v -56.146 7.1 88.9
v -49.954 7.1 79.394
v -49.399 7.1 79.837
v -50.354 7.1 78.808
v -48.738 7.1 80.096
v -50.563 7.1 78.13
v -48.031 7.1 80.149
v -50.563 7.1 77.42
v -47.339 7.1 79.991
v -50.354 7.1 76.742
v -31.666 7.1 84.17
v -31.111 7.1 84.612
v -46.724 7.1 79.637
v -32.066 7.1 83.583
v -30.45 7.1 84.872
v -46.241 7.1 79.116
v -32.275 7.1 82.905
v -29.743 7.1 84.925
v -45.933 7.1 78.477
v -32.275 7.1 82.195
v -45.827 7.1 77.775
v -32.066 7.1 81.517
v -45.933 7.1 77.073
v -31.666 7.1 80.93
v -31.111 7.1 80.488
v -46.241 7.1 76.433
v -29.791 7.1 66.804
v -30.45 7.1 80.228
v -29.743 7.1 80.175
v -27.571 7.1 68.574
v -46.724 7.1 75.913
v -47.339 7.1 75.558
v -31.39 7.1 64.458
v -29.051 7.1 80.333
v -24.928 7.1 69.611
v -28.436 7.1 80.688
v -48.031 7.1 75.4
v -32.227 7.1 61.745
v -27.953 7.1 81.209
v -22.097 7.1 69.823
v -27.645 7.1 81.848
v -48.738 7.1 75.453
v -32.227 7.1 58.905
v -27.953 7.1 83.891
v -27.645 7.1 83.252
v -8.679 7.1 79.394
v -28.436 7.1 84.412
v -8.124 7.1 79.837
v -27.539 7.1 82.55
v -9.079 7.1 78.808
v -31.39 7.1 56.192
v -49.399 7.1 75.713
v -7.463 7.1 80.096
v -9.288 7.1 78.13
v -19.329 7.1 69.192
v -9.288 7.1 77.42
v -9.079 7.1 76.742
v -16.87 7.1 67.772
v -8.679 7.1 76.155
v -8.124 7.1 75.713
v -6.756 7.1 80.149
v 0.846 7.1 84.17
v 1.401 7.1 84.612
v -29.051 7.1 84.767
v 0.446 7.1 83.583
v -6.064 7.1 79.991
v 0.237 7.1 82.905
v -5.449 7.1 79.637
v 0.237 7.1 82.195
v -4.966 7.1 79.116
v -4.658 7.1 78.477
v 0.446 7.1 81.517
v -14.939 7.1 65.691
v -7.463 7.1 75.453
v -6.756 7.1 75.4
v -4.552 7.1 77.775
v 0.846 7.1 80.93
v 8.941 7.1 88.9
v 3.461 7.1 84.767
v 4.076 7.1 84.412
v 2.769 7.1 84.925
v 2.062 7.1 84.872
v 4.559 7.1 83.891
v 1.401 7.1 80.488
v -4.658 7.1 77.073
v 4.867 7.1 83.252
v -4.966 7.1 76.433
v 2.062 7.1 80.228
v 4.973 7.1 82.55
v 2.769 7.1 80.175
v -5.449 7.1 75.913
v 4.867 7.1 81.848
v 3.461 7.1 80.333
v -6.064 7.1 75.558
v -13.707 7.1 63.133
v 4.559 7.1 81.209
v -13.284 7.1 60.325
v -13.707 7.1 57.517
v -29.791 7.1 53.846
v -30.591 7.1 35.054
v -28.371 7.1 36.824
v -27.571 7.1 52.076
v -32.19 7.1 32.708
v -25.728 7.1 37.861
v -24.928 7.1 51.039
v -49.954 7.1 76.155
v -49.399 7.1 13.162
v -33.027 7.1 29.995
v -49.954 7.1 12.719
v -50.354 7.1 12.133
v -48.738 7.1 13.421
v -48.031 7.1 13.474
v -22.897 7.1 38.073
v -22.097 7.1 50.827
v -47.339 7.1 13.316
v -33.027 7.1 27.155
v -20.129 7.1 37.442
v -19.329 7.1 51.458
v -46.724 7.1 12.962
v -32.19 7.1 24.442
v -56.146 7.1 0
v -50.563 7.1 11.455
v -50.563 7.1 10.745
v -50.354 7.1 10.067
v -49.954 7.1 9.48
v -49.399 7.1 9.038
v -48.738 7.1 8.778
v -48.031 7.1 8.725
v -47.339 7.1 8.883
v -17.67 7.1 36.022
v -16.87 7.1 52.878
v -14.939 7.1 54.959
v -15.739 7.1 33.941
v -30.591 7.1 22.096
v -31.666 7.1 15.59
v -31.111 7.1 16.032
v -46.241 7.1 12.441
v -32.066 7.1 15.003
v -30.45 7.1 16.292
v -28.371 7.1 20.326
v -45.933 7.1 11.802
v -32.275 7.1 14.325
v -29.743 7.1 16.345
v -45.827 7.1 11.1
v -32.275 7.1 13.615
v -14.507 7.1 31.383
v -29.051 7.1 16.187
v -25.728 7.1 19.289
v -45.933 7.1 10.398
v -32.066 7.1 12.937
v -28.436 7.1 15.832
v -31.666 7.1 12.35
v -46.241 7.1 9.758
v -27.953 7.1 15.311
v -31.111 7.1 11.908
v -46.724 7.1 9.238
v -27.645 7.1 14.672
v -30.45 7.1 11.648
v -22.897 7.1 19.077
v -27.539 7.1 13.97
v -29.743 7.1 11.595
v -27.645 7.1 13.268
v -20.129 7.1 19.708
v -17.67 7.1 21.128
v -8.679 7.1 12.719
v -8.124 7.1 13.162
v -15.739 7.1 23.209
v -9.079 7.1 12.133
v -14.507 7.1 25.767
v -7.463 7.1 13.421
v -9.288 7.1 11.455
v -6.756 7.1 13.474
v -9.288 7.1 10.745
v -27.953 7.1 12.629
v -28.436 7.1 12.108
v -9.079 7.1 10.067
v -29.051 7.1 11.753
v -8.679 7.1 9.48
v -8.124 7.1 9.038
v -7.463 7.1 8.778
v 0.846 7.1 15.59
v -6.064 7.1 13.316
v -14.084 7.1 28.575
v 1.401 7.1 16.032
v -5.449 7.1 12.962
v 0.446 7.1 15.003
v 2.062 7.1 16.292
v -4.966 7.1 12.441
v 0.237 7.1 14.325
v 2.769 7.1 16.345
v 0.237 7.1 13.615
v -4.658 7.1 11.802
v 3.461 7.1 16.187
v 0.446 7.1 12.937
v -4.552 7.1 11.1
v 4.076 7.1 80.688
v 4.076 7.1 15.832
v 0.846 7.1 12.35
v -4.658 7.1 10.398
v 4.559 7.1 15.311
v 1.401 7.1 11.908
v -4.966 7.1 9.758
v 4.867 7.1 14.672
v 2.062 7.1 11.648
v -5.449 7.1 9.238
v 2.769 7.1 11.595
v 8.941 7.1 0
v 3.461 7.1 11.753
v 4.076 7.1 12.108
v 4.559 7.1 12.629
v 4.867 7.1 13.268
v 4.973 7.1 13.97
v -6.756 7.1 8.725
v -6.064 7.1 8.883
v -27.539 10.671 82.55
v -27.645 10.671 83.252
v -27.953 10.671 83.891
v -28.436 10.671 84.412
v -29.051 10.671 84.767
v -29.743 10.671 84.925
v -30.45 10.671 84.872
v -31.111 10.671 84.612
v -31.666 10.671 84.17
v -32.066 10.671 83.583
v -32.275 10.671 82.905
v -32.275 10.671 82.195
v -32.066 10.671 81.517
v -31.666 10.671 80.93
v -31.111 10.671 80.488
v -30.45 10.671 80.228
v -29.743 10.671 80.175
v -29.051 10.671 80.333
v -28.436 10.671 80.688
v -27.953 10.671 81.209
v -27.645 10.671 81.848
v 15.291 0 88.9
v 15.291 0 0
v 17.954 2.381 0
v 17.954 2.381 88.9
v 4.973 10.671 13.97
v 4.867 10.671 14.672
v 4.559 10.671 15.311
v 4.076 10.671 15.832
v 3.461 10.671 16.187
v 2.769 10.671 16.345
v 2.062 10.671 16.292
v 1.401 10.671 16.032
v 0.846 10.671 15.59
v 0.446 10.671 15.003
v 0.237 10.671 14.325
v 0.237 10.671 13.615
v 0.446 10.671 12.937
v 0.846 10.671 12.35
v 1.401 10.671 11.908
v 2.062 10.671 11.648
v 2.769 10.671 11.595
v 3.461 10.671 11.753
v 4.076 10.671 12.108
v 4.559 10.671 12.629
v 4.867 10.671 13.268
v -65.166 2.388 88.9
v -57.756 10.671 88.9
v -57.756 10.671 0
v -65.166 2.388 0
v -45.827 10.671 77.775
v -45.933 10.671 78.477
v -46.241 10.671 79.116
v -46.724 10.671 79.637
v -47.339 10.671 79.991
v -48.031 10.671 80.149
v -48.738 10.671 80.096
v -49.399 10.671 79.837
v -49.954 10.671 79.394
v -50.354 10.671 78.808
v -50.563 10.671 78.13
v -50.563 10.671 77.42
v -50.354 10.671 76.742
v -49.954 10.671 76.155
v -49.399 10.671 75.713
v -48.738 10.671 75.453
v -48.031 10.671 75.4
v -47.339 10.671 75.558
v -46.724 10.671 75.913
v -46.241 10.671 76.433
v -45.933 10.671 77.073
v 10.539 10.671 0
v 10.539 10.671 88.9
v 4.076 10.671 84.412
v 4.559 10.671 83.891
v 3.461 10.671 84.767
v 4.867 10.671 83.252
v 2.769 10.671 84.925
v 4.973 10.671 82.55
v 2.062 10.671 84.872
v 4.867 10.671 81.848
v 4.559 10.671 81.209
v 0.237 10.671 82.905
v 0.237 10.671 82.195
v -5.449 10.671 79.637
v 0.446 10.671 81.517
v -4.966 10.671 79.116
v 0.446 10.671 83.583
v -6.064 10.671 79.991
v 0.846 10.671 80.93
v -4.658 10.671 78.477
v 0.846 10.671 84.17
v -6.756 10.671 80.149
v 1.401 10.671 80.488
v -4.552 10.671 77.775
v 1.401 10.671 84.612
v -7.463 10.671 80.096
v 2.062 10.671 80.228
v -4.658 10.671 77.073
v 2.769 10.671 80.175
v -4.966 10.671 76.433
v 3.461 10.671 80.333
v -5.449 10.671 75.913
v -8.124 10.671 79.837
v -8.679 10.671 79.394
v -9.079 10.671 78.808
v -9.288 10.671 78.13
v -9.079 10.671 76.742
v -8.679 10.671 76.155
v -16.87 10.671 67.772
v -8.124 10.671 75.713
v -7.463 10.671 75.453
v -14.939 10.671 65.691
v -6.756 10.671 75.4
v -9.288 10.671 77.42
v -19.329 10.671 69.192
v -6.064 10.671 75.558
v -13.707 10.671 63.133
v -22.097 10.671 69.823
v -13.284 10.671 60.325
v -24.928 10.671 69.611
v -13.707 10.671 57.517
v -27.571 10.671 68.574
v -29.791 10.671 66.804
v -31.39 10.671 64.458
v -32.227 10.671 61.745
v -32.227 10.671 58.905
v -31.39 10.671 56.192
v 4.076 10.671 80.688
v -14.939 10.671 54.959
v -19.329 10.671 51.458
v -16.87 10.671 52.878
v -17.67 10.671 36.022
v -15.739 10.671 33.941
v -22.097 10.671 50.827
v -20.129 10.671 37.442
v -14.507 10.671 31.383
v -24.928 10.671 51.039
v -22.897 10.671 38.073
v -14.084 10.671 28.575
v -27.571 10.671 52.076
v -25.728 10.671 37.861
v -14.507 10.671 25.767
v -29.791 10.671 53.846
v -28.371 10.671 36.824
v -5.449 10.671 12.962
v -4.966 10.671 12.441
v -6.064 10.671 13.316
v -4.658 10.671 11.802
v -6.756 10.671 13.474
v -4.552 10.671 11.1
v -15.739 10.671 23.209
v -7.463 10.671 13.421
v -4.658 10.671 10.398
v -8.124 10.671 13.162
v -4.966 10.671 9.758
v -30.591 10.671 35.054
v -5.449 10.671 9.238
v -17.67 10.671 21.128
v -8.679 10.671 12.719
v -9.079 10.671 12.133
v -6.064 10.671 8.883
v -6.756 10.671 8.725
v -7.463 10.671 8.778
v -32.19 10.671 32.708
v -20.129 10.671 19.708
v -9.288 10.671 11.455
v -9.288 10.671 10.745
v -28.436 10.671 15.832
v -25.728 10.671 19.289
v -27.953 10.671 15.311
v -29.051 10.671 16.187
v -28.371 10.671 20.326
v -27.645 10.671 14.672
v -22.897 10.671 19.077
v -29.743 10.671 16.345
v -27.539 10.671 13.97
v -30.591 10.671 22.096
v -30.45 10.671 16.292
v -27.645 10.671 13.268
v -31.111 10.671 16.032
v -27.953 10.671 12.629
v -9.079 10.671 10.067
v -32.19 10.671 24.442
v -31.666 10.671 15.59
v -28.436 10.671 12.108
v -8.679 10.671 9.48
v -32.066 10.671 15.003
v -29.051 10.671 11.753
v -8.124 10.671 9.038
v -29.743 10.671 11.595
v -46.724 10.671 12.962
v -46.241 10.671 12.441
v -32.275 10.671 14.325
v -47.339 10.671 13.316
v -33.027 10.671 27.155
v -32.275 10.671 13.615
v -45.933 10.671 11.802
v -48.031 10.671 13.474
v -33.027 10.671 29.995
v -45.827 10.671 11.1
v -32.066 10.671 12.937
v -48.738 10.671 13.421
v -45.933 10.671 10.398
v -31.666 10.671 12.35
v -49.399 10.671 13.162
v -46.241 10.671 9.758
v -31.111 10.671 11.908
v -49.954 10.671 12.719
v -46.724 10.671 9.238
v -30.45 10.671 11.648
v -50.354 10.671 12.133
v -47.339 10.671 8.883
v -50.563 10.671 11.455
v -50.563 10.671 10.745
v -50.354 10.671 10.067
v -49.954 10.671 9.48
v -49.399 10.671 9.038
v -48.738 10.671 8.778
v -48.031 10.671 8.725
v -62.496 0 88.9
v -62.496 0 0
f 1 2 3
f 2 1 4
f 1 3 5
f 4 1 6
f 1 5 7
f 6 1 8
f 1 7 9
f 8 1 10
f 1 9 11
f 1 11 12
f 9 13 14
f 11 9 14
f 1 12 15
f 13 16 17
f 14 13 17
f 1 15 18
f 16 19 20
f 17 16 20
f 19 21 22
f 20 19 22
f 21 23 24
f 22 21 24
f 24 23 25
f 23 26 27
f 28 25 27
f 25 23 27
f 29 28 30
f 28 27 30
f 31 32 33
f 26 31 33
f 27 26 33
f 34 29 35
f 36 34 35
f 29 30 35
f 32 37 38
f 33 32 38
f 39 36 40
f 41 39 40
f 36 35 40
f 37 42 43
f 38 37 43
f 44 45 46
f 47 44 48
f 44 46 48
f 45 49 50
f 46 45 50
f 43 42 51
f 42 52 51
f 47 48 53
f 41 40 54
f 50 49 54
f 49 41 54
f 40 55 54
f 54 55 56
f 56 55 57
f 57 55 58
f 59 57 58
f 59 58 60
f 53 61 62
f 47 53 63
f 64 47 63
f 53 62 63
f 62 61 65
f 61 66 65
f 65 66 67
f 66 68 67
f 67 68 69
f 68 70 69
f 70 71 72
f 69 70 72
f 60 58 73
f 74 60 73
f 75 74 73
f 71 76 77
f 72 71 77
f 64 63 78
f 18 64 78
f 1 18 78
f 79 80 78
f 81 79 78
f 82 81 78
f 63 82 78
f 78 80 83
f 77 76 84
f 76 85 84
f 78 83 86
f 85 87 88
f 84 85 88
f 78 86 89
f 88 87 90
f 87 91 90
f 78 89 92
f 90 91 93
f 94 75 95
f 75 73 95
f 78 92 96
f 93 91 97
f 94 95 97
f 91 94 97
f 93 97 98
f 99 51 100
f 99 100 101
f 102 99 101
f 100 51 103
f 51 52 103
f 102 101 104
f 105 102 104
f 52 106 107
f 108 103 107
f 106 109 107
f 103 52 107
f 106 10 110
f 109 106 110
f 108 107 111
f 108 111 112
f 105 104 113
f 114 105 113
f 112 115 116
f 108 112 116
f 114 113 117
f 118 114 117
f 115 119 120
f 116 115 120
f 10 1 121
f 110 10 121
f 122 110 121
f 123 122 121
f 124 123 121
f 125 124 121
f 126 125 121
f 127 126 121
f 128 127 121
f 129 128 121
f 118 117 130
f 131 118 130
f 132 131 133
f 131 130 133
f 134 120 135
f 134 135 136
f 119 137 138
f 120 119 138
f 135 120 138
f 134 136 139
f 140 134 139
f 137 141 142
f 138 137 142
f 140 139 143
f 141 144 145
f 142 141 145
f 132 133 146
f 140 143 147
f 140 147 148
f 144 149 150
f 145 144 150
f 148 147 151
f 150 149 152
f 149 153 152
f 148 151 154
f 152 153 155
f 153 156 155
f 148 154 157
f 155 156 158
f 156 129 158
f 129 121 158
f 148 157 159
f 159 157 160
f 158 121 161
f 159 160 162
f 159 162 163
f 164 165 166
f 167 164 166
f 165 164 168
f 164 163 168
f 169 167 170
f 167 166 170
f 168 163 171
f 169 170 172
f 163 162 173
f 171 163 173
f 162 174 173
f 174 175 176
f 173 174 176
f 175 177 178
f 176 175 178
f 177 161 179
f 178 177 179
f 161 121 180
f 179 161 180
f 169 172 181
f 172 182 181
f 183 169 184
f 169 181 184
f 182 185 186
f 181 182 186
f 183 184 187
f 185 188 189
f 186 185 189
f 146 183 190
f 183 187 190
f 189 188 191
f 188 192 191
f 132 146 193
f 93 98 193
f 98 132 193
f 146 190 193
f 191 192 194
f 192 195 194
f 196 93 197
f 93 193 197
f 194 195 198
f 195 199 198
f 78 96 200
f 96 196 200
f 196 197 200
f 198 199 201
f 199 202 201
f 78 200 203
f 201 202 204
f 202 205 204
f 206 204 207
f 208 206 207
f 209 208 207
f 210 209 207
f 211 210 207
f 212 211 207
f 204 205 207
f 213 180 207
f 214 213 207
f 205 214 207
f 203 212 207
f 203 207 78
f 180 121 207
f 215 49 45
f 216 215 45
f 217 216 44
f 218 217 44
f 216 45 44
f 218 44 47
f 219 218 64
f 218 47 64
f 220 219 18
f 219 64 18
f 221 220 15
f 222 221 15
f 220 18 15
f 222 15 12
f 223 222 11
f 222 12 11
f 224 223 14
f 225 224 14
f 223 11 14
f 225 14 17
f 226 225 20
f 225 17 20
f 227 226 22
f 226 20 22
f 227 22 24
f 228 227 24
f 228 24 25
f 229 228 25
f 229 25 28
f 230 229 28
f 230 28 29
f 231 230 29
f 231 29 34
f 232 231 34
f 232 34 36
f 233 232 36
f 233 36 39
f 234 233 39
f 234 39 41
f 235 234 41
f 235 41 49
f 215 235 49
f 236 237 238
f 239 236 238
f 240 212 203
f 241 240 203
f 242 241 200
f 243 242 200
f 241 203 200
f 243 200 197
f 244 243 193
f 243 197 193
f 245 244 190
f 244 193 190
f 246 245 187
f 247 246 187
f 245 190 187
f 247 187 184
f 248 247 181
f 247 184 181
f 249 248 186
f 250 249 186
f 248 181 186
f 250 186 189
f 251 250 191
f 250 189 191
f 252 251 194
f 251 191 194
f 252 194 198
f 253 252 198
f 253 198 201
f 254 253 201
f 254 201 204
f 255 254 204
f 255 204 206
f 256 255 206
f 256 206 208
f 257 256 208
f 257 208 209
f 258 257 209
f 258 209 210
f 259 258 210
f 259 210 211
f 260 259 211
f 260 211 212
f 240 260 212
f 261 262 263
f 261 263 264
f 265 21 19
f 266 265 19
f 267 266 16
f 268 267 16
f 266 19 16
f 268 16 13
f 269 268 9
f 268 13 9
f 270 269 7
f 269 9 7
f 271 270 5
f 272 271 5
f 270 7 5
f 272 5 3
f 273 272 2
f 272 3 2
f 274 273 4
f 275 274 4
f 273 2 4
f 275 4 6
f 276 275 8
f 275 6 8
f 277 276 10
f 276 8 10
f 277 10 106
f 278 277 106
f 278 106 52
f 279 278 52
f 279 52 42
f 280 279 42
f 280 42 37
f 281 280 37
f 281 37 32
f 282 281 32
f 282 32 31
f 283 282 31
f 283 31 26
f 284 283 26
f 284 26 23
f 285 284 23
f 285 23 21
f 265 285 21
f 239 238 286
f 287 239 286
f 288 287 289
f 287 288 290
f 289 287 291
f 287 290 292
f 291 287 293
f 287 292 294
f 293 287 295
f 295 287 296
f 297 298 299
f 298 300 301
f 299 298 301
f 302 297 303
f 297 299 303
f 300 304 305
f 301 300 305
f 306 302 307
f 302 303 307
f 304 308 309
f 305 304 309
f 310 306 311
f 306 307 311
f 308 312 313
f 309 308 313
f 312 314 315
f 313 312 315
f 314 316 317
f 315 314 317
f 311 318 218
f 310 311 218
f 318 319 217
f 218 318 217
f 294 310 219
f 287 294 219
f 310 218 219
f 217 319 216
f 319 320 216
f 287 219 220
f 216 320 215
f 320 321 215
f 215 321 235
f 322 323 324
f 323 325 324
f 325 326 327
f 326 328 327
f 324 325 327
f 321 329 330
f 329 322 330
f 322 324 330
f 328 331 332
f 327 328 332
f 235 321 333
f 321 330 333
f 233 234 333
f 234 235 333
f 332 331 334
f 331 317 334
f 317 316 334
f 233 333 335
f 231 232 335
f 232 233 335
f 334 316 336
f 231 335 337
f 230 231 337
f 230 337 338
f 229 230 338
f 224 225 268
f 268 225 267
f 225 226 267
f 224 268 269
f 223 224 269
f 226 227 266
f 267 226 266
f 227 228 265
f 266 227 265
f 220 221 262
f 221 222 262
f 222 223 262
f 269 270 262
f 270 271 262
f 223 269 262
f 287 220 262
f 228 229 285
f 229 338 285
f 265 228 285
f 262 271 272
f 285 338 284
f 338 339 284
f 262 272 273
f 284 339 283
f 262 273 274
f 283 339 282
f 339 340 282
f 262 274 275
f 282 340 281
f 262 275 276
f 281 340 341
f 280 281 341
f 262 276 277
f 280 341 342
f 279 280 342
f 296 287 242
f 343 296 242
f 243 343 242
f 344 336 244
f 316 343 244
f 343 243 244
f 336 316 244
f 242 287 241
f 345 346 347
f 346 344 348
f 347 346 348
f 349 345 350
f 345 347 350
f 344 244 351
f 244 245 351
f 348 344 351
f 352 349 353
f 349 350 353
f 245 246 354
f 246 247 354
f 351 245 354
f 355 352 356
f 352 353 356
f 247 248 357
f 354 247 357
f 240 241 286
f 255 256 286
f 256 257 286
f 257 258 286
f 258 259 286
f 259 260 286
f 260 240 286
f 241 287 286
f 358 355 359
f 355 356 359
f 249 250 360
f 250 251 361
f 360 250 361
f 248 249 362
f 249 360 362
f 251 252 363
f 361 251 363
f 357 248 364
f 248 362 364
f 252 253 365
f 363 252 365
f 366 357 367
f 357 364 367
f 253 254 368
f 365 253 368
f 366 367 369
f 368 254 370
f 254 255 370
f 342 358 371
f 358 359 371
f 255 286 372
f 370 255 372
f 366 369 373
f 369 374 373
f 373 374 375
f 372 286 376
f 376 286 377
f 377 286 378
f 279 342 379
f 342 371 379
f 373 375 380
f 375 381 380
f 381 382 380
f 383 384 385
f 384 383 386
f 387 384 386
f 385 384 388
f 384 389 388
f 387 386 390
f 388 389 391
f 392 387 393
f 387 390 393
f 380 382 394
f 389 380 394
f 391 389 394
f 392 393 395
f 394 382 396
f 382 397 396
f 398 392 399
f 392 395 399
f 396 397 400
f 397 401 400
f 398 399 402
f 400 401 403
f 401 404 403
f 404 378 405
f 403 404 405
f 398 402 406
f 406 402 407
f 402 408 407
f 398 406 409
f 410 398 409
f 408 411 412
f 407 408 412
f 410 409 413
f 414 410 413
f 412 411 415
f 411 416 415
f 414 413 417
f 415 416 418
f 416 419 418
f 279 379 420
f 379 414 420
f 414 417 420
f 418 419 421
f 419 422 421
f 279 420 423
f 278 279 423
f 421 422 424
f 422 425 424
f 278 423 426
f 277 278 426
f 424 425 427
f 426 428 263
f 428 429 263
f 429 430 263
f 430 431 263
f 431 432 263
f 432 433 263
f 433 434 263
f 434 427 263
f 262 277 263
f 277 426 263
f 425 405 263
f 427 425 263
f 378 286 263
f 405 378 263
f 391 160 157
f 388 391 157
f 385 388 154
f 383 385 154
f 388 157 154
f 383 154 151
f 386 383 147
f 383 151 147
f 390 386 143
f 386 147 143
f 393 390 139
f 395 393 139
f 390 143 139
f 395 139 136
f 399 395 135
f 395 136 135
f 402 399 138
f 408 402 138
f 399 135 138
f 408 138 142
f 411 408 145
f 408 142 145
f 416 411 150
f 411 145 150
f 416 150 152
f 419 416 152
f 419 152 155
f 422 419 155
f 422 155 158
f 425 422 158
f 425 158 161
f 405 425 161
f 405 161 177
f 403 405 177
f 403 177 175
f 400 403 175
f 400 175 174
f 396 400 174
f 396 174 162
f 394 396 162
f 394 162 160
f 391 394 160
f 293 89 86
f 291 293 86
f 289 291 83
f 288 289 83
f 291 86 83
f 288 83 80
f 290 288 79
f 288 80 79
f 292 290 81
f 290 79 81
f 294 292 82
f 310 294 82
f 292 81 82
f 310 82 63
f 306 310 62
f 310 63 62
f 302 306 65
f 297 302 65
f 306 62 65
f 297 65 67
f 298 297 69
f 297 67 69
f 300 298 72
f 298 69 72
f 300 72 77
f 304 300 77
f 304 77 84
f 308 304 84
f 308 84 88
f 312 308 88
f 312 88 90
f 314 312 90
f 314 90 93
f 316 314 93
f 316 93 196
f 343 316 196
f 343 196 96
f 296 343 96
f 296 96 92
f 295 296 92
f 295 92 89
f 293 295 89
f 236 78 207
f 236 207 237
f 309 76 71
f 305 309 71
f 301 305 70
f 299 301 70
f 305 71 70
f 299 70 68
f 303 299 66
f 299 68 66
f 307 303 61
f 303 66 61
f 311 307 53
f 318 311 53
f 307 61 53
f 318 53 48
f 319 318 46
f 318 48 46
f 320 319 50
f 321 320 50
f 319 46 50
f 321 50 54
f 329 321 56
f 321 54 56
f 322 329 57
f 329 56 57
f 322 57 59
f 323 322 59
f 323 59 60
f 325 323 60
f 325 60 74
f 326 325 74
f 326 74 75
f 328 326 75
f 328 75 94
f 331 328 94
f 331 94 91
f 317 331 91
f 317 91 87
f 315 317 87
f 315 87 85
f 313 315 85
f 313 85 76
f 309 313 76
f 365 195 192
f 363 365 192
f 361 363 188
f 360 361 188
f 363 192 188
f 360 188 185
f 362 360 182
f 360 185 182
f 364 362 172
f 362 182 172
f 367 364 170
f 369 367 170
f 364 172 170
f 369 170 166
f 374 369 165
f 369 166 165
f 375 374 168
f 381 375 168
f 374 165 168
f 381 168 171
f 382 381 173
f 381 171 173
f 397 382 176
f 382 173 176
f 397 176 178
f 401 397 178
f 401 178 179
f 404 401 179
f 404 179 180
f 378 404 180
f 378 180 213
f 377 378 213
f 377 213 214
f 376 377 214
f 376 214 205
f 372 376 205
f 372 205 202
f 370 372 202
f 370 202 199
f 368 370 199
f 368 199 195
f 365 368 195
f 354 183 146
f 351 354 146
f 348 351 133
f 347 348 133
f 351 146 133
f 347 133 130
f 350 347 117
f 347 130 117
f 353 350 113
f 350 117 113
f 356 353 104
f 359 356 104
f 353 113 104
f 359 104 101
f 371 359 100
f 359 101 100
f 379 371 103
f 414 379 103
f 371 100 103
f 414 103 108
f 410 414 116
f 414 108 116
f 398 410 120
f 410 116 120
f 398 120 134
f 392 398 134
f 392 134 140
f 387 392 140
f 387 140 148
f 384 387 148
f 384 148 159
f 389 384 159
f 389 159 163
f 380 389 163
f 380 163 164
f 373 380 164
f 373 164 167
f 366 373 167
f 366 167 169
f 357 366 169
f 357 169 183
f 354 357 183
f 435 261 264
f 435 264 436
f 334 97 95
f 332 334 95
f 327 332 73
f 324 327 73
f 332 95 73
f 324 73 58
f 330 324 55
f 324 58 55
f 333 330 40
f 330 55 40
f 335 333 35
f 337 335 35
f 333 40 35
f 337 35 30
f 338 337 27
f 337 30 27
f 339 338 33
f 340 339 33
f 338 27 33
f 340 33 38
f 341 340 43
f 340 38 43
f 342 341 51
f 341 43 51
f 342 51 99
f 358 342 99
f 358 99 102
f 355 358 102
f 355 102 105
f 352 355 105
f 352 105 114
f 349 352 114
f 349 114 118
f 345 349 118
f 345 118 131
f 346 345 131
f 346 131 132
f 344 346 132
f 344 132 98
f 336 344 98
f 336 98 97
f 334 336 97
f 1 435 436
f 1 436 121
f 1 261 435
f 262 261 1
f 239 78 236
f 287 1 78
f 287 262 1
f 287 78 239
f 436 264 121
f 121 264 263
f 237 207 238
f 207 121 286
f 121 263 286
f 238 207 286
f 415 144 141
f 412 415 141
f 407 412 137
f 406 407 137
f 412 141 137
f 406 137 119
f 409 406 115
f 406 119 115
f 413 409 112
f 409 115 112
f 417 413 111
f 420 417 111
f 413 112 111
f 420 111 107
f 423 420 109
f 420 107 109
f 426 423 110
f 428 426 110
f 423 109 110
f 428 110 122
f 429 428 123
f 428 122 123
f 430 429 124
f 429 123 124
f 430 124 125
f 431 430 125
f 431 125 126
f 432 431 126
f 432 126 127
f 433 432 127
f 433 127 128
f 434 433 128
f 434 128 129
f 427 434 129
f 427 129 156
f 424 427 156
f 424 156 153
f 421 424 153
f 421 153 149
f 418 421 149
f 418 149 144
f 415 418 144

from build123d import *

# Parameters (mm, degrees)
F1_DEPTH = 88.9
F3_D     = 19.05
F5_D     = 4.7625


# Not quite as in the source:
# - a feature names something its author has since deleted; it is built from what else it names


with BuildPart() as f1:
    # F0 (on Top) → F1 (new body)
    with BuildSketch(Plane.XY):
        Polygon((10.538799933, 10.6713908286), (-57.7562613184, 10.6713908286), (-65.16550908, 2.3876), (-62.4960911285, 0), (-56.1460911285, 7.0995158286), (8.9414088715, 7.0995158286), (15.2914088715, 0), (17.9537273073, 2.38125), align=None)
    extrude(amount=F1_DEPTH)

    # F3 (through all)
    with Locations(Plane(origin=(0, 10.6713908286, 0), x_dir=(-1, 0, 0), z_dir=(0, 1, 0))):
        with Locations((22.8085911285, 60.325), (23.6087306927, 28.575)):
            Hole(F3_D / 2)

    # F5 (through all)
    with Locations(Plane(origin=(0, 10.6713908286, 0), x_dir=(-1, 0, 0), z_dir=(0, 1, 0))):
        with Locations((-2.5914088715, 82.55), (29.9205911285, 82.55), (29.9205911285, 13.97), (-2.5914088715, 13.97), (48.2085911285, 11.0998), (48.2085911285, 77.7748), (6.9335911285, 77.7748), (6.9335911285, 11.0998)):
            Hole(F5_D / 2)


solid = f1.part
